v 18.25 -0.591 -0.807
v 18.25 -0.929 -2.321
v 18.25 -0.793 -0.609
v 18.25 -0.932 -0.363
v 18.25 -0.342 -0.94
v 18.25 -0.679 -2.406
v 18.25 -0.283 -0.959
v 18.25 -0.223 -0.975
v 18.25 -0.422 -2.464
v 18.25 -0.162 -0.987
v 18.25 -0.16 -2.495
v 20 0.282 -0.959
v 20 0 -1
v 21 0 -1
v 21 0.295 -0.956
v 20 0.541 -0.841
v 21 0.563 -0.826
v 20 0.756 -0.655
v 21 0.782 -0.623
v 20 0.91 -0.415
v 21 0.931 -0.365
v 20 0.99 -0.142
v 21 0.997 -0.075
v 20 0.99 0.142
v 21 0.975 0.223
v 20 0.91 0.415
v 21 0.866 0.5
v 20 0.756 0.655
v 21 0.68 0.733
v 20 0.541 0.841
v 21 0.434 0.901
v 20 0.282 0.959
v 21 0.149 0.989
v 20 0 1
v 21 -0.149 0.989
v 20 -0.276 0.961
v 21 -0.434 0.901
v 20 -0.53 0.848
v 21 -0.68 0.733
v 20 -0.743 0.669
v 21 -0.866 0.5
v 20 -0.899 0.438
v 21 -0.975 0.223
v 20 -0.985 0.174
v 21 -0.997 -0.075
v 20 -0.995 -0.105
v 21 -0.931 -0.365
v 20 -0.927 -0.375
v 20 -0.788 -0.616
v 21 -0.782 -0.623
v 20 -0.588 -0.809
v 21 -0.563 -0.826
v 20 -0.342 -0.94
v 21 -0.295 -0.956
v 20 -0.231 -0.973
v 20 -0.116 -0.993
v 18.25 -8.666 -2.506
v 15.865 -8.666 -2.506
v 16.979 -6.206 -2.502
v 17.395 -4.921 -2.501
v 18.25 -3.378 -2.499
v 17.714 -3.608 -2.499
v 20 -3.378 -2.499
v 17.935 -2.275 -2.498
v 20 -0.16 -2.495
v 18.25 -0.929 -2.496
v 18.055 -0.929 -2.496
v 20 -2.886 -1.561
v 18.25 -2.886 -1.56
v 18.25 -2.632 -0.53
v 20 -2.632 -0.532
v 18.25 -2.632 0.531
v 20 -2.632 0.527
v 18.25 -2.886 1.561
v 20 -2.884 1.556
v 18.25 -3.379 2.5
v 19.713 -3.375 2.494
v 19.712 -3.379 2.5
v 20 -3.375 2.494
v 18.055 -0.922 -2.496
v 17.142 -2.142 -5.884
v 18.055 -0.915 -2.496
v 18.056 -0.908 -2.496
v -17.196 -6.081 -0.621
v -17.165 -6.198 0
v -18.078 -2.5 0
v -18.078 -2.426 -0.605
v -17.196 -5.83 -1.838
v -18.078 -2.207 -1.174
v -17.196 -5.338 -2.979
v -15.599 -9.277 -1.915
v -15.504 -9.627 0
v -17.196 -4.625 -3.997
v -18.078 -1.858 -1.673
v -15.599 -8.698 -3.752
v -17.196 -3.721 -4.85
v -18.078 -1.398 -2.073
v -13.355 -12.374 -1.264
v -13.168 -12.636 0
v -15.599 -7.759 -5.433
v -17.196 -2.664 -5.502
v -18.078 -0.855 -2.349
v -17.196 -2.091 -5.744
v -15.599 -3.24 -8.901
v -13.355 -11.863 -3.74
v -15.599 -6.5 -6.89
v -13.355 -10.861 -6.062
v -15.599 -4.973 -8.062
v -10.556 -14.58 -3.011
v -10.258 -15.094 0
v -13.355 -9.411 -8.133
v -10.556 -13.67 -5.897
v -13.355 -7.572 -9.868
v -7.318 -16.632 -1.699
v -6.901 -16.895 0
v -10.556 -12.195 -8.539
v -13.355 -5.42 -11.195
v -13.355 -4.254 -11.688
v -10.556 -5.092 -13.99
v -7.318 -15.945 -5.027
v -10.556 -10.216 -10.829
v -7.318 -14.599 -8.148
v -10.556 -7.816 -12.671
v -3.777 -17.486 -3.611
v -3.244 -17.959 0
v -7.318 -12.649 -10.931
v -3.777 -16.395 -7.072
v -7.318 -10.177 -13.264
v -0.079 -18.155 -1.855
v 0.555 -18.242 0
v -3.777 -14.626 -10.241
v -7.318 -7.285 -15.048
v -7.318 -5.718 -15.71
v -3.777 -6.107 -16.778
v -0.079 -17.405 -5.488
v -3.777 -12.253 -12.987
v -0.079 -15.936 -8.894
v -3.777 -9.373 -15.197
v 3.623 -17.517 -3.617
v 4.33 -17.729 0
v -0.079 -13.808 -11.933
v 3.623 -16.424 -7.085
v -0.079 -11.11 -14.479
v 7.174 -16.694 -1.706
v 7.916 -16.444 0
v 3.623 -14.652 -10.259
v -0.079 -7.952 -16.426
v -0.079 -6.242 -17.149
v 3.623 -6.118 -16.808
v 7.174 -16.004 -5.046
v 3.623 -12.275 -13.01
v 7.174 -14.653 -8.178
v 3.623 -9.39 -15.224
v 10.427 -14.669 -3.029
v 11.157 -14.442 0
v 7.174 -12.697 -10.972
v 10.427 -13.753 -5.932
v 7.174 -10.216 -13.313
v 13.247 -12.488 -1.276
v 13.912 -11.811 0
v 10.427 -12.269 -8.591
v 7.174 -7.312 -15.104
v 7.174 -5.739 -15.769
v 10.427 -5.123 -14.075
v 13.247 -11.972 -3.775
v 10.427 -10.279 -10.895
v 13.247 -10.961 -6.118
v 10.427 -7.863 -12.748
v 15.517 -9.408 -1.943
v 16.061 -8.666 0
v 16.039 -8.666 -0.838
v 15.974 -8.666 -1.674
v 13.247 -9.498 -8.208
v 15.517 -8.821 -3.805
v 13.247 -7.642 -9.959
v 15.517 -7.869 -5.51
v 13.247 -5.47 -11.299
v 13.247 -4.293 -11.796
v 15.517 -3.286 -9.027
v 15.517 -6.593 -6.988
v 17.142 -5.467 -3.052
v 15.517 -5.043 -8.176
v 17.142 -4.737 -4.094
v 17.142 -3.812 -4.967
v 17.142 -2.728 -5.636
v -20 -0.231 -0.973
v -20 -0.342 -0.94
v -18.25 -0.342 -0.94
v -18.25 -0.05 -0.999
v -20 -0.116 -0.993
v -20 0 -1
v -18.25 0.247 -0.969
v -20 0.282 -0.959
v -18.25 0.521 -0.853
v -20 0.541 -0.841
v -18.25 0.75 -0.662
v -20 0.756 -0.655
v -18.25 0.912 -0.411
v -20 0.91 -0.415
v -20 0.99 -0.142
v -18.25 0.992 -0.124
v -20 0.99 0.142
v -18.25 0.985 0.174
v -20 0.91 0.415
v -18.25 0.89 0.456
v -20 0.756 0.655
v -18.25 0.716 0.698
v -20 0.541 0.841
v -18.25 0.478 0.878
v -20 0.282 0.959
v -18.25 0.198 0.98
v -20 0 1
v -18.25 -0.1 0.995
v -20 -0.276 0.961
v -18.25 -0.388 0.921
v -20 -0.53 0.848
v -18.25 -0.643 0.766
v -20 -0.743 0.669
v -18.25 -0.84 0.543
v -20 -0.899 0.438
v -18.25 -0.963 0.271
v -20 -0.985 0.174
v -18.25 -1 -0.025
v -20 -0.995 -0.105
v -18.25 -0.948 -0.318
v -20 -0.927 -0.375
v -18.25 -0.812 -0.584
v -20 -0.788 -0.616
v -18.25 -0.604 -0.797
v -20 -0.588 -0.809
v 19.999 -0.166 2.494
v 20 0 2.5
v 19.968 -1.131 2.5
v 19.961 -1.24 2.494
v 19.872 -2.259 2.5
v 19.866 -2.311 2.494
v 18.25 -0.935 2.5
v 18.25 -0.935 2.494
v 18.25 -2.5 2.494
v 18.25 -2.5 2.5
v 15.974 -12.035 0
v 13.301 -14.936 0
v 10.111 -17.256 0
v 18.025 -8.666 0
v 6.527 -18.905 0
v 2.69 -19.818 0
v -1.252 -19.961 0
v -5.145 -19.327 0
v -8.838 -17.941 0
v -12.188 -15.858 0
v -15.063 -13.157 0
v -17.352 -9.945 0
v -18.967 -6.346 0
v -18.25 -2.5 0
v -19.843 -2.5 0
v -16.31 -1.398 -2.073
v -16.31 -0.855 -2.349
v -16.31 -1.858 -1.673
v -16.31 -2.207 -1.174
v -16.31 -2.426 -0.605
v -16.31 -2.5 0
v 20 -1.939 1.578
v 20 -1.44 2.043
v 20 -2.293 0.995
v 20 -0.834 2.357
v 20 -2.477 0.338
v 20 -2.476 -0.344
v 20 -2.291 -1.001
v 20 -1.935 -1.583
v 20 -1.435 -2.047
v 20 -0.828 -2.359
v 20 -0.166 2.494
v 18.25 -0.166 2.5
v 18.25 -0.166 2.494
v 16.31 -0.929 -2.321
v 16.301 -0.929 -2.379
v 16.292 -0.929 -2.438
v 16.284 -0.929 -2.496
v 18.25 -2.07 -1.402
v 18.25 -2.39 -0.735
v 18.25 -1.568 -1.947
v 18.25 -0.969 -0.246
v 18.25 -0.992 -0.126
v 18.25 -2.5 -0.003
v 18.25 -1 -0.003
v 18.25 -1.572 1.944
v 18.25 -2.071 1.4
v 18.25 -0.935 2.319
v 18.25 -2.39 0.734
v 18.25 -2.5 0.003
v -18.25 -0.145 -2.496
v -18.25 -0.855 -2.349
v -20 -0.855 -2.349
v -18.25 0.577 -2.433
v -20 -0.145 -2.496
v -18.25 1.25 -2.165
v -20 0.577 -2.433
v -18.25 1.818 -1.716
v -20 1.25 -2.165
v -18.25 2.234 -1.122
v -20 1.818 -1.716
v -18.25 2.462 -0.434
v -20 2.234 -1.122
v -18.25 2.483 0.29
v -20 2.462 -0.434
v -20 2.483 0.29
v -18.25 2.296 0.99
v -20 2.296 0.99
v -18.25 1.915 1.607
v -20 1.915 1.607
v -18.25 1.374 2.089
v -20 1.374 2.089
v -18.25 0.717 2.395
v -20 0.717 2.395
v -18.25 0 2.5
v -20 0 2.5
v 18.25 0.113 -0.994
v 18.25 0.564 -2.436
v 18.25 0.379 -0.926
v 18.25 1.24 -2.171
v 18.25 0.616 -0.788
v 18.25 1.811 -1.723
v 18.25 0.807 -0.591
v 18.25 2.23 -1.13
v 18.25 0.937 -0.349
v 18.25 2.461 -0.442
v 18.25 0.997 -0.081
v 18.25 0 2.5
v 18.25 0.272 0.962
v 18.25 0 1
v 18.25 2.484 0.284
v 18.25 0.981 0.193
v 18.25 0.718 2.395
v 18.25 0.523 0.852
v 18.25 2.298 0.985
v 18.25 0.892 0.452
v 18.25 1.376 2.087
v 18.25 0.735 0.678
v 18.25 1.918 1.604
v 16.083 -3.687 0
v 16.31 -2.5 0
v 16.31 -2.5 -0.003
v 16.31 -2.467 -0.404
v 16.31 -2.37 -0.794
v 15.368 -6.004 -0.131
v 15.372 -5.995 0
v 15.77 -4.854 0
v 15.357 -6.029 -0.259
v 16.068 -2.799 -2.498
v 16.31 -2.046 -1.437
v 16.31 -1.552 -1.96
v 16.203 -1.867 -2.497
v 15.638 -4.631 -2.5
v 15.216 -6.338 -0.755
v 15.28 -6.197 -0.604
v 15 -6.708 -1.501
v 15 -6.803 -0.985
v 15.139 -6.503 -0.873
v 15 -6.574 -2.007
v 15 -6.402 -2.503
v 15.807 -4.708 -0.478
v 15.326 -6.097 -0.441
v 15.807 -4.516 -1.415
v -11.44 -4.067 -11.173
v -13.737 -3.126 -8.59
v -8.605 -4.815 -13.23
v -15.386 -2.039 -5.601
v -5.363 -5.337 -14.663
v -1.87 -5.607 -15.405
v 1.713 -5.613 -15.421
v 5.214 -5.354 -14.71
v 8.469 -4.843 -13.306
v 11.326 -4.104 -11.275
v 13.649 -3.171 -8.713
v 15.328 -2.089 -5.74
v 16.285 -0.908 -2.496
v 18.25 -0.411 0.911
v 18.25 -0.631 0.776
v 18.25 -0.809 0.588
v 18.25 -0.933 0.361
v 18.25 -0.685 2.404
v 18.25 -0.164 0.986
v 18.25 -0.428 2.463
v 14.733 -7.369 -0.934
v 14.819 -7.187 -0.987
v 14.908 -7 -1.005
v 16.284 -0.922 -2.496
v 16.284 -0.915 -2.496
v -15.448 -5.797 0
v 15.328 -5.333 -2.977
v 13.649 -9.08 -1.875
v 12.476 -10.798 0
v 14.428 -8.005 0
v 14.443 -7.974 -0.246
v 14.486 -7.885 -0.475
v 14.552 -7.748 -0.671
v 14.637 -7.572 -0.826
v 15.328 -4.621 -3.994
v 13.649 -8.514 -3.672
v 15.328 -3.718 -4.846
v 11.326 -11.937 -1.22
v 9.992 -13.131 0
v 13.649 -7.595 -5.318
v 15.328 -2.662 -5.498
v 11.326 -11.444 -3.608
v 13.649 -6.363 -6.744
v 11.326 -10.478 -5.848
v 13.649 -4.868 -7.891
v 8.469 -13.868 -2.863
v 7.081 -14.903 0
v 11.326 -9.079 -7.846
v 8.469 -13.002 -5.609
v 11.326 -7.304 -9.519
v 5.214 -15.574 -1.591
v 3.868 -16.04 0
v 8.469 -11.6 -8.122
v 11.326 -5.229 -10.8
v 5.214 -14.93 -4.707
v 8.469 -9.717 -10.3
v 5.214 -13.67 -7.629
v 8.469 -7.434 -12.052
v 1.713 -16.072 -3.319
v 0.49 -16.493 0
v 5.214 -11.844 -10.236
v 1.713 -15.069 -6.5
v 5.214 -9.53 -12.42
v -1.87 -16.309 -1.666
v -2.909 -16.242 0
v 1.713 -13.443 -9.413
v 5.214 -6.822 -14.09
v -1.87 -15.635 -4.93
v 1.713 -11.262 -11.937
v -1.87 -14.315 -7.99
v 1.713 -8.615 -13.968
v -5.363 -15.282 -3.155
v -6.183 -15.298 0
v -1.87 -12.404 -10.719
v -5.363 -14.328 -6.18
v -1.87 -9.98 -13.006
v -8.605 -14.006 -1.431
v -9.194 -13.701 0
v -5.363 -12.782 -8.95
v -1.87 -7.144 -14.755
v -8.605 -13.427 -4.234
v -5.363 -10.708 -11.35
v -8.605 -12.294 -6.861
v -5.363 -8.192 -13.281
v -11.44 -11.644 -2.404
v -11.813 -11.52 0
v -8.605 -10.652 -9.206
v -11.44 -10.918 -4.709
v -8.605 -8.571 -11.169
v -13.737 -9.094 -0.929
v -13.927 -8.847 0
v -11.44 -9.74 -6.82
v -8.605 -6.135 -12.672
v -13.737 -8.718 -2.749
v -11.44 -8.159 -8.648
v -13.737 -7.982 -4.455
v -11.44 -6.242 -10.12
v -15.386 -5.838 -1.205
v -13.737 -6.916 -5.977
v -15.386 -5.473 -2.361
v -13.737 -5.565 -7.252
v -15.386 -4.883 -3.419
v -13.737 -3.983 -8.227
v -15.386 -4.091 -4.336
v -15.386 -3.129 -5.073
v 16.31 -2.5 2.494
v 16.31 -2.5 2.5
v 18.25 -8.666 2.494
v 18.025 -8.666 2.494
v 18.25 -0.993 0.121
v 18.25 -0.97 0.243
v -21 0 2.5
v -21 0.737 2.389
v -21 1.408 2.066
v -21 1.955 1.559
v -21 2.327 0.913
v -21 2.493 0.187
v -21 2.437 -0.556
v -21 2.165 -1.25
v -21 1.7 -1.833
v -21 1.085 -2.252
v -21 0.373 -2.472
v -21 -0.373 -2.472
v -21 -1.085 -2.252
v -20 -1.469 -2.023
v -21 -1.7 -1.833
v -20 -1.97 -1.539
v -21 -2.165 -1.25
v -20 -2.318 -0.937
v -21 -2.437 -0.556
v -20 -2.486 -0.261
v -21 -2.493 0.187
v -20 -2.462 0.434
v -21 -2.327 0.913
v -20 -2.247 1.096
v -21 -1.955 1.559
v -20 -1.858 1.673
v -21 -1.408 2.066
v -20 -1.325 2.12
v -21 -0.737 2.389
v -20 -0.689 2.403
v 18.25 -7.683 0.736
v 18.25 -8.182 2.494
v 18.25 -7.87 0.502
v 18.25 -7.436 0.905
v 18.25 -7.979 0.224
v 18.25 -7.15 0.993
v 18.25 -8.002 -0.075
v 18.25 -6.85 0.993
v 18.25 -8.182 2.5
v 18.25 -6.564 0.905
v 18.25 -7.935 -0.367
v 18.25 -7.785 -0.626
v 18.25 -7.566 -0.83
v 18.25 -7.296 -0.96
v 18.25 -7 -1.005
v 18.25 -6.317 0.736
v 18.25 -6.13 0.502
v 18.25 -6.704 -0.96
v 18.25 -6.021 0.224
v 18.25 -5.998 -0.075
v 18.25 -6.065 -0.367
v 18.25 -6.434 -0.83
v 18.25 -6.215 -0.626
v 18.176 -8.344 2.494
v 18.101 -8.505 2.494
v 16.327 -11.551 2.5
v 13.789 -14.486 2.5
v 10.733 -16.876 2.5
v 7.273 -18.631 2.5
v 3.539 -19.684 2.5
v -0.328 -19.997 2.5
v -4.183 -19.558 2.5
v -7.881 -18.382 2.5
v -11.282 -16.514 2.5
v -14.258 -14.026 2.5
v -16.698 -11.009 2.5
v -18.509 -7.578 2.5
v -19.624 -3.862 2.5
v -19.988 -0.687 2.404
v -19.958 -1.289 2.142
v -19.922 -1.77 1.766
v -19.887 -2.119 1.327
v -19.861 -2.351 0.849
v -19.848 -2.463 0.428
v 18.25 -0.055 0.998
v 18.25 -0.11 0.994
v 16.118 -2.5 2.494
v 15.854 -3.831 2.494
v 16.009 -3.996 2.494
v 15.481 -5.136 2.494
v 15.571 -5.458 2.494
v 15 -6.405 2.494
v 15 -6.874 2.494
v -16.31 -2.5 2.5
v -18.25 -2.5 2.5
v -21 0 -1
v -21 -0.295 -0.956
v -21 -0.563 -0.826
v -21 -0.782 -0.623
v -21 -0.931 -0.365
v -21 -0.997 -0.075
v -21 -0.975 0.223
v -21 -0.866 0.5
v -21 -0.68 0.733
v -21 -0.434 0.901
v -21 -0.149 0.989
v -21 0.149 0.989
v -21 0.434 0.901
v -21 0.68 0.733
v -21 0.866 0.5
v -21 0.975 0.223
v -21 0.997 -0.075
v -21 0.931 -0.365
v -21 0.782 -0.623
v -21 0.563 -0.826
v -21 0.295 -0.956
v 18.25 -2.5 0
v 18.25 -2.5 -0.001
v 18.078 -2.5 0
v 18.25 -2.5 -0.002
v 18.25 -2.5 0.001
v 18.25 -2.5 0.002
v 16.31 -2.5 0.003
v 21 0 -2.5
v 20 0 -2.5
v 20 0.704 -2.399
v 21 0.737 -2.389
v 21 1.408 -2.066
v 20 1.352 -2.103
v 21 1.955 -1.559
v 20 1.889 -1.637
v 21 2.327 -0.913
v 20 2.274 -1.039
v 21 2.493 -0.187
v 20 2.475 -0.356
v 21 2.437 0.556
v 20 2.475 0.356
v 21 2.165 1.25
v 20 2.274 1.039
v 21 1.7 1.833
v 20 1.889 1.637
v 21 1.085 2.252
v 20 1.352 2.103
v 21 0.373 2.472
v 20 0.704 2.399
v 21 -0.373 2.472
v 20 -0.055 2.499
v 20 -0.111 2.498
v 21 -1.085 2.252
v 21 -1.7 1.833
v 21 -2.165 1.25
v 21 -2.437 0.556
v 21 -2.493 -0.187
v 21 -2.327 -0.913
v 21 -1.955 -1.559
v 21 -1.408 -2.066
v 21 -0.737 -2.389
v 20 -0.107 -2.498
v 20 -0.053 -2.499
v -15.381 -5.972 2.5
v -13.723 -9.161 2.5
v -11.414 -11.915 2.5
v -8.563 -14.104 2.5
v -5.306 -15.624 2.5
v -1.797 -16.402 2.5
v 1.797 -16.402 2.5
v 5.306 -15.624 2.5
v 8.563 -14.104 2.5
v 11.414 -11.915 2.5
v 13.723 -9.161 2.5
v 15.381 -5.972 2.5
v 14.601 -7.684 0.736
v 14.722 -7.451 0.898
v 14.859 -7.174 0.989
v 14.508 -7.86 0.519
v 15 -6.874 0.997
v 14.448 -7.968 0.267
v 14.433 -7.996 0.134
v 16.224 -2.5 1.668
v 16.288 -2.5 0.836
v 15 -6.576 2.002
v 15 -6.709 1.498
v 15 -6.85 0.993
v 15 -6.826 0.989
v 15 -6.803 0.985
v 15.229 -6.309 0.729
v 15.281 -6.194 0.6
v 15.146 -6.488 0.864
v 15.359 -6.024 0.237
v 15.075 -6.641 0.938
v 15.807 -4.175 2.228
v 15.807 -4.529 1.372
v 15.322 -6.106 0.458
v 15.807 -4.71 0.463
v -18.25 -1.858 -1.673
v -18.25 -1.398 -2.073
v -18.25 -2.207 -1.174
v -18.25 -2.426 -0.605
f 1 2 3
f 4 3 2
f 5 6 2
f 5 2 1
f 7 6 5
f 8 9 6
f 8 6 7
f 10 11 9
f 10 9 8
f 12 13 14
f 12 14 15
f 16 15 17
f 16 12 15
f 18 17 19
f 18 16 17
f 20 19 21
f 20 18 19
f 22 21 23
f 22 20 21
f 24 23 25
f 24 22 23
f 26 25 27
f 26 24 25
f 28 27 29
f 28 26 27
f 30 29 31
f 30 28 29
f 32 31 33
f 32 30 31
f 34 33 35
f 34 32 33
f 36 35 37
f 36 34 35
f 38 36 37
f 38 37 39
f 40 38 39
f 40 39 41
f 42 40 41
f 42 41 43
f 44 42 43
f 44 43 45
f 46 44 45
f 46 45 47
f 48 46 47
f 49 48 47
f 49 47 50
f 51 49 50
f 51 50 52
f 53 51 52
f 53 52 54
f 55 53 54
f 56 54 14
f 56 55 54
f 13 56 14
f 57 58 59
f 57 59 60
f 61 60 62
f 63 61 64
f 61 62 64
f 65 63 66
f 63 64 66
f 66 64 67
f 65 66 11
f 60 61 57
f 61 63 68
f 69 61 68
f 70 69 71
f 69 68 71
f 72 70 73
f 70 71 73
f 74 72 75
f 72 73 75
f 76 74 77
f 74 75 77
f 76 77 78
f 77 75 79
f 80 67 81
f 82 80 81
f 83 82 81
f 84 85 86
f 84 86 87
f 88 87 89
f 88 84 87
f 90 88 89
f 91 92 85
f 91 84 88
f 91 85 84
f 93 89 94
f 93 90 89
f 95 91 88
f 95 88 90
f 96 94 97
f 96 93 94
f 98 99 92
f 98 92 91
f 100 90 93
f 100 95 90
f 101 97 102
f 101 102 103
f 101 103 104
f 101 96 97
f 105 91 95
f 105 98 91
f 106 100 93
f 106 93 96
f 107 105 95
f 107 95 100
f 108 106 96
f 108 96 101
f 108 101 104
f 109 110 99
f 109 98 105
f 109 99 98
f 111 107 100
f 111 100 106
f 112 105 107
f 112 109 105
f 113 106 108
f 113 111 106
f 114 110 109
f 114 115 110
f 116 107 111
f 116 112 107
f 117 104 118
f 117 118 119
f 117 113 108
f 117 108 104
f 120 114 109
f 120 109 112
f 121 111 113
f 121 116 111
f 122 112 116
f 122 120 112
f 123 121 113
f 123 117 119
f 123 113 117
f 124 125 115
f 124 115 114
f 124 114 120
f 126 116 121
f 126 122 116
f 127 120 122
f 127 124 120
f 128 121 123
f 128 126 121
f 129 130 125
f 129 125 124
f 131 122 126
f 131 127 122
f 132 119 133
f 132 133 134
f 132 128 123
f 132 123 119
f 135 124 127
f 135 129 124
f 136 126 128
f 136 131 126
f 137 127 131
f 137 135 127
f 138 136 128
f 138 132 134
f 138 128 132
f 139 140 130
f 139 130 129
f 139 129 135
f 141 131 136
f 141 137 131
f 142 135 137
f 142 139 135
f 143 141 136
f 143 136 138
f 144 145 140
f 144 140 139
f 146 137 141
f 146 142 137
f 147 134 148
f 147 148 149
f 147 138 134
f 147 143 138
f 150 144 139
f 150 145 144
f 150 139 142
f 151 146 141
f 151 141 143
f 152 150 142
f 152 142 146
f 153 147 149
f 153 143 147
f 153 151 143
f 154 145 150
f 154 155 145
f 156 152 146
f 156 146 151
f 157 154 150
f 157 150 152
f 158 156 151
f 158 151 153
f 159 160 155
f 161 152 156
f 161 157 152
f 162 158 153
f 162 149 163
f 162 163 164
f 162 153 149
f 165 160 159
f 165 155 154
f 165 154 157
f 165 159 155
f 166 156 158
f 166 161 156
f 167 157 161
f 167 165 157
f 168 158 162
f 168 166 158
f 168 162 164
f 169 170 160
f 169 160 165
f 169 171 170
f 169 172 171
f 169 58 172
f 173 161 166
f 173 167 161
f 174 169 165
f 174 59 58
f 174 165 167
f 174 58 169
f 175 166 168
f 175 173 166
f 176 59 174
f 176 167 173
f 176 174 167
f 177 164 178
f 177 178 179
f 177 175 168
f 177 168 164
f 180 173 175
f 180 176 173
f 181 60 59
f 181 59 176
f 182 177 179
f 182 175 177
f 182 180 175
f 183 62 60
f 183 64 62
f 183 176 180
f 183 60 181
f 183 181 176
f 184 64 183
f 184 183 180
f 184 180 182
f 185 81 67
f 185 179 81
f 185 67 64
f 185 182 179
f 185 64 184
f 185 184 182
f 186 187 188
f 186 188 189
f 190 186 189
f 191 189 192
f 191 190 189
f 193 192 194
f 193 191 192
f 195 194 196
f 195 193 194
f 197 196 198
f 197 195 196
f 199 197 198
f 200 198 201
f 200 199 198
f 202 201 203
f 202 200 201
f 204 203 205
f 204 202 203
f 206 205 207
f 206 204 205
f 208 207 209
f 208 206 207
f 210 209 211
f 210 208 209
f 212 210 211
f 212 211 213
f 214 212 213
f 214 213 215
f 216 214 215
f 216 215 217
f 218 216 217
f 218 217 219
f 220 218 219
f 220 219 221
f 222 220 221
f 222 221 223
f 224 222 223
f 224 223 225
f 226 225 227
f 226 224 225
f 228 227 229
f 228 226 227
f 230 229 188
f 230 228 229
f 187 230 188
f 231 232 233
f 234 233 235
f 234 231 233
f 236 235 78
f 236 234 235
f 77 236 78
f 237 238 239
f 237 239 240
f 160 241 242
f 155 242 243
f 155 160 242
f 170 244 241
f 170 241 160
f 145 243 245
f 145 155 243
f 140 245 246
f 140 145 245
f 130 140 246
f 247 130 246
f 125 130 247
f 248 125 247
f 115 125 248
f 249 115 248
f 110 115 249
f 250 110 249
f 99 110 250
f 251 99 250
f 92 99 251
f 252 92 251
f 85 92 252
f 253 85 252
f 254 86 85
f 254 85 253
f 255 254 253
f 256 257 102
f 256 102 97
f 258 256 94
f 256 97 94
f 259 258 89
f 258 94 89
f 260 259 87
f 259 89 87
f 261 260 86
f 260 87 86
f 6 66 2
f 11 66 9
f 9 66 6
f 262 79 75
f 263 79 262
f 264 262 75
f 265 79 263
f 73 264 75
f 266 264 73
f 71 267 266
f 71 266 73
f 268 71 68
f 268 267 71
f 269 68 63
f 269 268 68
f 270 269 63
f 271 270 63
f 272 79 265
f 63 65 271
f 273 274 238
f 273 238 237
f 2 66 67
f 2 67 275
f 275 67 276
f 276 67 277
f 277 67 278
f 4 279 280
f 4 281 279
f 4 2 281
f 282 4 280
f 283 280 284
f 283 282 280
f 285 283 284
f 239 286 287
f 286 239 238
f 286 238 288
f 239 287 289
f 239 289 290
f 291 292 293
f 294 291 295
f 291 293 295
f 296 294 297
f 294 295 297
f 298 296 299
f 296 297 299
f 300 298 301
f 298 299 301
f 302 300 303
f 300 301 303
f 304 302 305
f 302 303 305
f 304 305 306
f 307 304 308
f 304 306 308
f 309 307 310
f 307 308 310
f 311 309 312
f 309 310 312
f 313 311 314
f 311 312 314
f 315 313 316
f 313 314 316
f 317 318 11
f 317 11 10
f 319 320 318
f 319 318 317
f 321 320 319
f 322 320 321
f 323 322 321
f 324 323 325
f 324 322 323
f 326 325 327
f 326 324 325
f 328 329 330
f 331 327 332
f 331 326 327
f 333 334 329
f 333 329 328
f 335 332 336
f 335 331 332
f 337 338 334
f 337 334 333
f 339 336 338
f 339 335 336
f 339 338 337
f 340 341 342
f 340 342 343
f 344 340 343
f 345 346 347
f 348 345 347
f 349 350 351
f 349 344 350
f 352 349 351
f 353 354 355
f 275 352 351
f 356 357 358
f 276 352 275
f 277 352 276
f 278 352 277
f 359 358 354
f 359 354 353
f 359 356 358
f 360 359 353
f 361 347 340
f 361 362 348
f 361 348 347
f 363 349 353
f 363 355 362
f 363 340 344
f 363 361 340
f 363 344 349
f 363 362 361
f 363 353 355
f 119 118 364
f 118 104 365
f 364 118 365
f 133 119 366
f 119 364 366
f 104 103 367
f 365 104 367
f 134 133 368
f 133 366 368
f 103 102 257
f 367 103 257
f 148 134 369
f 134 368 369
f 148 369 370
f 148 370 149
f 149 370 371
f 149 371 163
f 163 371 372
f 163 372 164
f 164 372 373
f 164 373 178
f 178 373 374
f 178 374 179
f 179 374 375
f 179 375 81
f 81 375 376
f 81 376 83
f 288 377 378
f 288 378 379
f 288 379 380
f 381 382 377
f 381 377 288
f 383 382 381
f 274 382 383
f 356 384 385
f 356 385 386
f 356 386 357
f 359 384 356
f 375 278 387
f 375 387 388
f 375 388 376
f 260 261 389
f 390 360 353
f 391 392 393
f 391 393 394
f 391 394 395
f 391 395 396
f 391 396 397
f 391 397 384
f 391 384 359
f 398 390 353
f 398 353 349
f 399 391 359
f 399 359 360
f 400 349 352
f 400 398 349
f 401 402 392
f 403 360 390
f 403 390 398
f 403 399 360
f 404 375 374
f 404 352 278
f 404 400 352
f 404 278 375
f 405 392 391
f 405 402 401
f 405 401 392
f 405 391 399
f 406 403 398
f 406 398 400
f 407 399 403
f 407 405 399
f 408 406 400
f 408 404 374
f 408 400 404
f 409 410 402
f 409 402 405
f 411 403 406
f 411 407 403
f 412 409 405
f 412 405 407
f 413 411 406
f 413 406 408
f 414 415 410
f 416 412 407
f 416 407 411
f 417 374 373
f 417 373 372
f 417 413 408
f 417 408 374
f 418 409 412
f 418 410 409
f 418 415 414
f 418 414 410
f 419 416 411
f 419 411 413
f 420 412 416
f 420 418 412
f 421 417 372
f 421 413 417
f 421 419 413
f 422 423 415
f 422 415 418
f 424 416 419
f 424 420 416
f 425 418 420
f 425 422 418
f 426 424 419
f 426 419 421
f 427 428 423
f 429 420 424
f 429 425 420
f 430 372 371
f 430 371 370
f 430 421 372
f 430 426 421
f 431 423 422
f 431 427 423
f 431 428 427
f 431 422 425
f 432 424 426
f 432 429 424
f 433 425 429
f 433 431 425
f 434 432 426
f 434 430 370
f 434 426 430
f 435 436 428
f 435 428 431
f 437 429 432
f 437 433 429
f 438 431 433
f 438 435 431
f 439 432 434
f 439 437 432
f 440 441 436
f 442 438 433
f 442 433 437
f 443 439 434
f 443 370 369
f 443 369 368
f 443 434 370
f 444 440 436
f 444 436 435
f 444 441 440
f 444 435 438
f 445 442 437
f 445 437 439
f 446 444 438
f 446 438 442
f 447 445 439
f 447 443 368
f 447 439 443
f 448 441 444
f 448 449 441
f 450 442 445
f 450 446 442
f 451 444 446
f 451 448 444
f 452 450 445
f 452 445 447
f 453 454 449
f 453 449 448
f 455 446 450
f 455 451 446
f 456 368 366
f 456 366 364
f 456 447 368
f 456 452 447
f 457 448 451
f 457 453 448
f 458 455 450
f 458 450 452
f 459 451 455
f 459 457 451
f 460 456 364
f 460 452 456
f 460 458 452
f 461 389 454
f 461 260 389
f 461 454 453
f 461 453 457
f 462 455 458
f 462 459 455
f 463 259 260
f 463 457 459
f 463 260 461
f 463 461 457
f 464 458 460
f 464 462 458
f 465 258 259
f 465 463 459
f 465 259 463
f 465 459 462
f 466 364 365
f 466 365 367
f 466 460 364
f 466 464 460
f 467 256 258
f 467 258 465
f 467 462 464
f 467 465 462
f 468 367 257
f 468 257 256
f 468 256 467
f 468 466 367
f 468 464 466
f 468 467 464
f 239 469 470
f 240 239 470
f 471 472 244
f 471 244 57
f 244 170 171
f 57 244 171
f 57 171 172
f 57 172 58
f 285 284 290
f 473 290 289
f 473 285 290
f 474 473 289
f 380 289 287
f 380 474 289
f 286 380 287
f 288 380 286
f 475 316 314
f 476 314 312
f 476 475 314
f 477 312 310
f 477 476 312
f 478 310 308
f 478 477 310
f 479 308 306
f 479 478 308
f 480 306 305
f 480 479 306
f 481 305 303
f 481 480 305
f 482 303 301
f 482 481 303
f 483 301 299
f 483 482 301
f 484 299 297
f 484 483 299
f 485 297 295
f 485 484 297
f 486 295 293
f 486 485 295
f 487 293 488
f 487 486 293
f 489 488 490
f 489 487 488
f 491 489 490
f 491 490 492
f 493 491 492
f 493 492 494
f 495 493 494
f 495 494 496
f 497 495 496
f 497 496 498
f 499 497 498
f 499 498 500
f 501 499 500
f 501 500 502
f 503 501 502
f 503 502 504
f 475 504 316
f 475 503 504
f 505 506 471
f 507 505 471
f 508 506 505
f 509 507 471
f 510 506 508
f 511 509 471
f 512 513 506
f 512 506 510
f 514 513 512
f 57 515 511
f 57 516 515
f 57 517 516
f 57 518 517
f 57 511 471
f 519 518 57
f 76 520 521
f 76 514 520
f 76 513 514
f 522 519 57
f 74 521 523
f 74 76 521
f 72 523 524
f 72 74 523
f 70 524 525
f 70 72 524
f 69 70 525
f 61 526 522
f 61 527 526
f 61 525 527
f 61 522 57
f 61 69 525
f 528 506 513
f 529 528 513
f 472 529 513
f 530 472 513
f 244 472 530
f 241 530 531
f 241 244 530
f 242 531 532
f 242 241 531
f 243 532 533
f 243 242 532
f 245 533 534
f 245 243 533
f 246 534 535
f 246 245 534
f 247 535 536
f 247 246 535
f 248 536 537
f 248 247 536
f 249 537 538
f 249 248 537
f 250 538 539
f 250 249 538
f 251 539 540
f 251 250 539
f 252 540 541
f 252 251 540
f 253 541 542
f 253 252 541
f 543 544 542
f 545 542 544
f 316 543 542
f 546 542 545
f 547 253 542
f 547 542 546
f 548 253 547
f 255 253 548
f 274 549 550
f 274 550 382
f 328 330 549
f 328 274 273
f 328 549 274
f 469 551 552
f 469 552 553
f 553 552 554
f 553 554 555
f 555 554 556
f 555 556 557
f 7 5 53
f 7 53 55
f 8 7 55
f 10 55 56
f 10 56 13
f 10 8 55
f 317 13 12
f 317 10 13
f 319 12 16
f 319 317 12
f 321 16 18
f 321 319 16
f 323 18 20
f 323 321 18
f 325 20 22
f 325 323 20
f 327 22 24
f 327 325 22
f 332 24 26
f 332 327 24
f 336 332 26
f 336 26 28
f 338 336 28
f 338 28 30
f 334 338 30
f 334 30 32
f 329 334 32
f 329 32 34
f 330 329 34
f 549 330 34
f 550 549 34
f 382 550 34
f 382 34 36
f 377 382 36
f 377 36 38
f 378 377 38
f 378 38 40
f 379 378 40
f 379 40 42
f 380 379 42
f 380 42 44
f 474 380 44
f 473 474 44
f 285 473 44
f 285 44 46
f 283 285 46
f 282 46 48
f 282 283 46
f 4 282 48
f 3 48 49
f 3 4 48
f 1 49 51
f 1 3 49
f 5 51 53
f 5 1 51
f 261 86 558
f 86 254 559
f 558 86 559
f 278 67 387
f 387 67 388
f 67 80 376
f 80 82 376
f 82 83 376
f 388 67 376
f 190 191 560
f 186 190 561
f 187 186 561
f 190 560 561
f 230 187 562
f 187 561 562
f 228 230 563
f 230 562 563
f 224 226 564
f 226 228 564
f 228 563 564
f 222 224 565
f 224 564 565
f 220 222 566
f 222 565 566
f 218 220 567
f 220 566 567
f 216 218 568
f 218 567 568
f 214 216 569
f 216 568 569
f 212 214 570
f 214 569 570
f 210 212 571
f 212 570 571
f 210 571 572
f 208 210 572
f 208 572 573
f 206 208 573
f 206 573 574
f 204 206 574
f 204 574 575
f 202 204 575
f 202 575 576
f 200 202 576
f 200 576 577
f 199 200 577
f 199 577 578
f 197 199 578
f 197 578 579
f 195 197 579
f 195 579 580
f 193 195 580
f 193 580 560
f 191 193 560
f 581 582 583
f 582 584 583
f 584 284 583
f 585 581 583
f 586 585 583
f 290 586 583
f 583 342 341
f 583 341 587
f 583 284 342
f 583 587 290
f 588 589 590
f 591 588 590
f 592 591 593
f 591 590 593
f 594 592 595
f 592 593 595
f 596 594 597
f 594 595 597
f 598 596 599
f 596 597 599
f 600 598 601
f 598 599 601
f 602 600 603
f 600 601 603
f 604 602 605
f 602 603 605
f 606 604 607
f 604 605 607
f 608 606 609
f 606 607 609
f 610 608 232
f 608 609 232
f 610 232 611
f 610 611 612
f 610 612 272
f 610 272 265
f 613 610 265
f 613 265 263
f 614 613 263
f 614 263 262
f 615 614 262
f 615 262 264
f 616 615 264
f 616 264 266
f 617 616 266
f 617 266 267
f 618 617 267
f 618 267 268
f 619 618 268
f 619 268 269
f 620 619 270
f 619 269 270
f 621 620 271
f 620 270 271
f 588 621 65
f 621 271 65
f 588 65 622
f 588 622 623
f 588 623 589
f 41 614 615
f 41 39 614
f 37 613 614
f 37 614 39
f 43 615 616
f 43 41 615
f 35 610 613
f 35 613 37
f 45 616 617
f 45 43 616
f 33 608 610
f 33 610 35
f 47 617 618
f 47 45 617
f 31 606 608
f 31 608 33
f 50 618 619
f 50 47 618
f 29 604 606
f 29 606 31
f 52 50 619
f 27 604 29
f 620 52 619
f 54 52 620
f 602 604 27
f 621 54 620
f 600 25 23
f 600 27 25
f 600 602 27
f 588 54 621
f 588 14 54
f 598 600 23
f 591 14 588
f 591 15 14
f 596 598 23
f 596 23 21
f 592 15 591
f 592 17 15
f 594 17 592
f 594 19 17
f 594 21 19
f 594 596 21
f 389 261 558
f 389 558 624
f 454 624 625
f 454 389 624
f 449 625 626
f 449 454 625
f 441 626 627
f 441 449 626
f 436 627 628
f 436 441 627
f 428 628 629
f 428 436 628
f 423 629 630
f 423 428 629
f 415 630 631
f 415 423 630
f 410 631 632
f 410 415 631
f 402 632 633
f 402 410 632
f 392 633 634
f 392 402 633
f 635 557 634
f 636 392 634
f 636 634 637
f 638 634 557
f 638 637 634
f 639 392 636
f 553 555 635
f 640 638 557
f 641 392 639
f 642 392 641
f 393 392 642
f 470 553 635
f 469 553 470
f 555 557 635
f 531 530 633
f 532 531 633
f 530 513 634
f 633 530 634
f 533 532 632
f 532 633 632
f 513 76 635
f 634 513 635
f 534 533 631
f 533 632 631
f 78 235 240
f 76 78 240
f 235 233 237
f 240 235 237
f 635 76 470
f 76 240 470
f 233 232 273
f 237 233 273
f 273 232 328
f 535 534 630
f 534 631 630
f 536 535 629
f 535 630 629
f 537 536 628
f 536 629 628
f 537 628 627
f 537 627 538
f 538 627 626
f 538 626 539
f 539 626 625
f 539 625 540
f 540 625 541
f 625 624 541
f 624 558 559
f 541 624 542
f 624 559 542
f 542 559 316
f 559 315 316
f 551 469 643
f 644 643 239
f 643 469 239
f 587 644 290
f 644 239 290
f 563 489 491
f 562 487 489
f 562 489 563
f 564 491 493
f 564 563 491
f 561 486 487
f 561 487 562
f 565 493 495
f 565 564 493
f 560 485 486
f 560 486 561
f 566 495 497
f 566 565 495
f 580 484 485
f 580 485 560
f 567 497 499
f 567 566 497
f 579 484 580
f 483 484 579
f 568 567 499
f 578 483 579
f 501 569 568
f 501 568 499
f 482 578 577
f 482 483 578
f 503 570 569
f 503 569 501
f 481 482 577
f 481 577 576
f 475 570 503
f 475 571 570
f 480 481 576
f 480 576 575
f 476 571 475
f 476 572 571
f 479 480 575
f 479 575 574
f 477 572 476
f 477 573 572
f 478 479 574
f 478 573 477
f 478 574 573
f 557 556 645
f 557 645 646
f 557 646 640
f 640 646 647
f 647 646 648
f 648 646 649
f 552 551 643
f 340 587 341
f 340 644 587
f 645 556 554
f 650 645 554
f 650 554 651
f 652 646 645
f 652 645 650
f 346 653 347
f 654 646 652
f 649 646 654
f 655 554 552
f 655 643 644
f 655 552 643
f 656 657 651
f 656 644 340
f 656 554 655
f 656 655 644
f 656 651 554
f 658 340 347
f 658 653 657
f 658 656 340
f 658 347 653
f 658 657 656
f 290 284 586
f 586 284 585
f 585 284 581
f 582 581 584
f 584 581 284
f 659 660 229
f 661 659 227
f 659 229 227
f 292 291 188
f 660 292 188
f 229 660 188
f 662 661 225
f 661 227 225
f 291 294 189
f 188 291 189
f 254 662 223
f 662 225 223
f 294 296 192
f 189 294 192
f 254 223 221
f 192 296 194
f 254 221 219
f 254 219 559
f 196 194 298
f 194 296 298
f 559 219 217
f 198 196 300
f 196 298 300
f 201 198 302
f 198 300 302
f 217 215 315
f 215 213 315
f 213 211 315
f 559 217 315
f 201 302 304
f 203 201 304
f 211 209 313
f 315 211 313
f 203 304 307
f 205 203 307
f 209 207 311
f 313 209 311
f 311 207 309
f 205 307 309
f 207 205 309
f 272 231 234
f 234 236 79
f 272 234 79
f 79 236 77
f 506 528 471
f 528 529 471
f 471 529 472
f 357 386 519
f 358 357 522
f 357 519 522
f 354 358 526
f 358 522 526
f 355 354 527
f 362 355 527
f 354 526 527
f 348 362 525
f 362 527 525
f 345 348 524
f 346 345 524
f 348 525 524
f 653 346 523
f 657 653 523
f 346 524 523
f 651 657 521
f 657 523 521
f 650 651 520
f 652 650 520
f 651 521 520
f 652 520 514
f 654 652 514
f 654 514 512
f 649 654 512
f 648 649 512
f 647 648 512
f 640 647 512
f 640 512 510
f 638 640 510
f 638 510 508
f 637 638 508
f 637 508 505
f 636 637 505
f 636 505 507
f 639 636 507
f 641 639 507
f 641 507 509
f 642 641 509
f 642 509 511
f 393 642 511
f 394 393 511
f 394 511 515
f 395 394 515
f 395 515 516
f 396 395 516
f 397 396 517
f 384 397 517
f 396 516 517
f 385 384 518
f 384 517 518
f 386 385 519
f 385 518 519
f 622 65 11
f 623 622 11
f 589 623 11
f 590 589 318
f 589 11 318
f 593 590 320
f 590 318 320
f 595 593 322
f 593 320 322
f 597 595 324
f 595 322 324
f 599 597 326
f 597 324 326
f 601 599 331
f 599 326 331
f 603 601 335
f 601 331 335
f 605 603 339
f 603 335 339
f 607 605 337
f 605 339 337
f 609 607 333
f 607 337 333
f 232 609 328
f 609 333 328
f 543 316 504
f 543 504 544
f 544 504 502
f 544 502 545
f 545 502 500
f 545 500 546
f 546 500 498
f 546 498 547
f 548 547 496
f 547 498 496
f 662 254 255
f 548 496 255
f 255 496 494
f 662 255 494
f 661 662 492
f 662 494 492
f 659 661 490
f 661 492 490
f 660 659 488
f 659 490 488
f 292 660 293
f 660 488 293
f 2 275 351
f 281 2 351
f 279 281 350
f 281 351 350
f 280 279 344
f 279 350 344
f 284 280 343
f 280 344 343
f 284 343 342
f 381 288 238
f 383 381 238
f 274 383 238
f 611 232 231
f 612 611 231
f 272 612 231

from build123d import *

# Parameters (mm, degrees)
EXTRUDE_1_DEPTH          = 2.5
REVOLVE_1_ANGLE          = 70.00000000000016
EXTRUDE_2_DEPTH          = 20
EXTRUDE_2_DEPTH_BACK     = 20
SKETCH_4_R               = 2.5
SKETCH_4_R_2             = 1
CUT_EXTRUDE_1_DEPTH      = 18.25
CUT_EXTRUDE_1_DEPTH_BACK = 18.25
SKETCH_5_R               = 1
CUT_EXTRUDE_START        = -100
SKETCH_6_R               = 1
CUT_EXTRUDE_2_DEPTH      = 100
EXTRUDE_START            = -5
SKETCH_8_R               = 1
EXTRUDE_3_DEPTH          = 5
SKETCH_9_R               = 1.004563182831931
CUT_EXTRUDE_3_DEPTH      = 10
EXTRUDE_START_2          = 1
SKETCH_10_R              = 2.5
SKETCH_10_R_2            = 1
EXTRUDE_4_DEPTH          = 1
SKETCH_11_R              = 2.500000000000001
SKETCH_11_R_2            = 1.0000000000000002
EXTRUDE_5_DEPTH          = 1
SKETCH_13_W              = 11.686063100659794
SKETCH_13_H              = 0.769389088656252
CUT_EXTRUDE_4_DEPTH      = 10
CUT_EXTRUDE_5_DEPTH      = 10
SKETCH_15_R              = 4.4
CUT_EXTRUDE_7_DEPTH      = 1.75


with BuildPart() as part:
    # 草图1 → 凸台-拉伸1 (new body)
    with BuildSketch(Plane.XY):
        with BuildLine():
            Line((-20, 0), (-16.500000000000004, 0))
            ThreePointArc((-16.500000000000004, 0), (1.01e-15, -16.499999999999996), (16.500000000000004, 0))
            Line((16.500000000000004, 0), (20, 0))
            ThreePointArc((20, 0), (1.22e-15, -19.999999999999982), (-20, 0))
        make_face()
    extrude(amount=EXTRUDE_1_DEPTH)

    # 草图2 → 旋转1 (revolve)
    with BuildSketch(Plane(origin=(0, 0, 0), x_dir=(-1, 0, 0), z_dir=(0, 0, -1))):
        with BuildLine():
            Line((-18.25, 0), (-16.500000000000004, 0))
            ThreePointArc((-16.500000000000004, 0), (1.01e-15, -16.5), (16.500000000000004, 1.33e-15))
            Line((16.500000000000004, 1.33e-15), (18.250000000000004, 6.6e-16))
            ThreePointArc((18.250000000000004, 6.6e-16), (-2.93e-15, -18.25), (-18.25, 0))
        make_face()
    revolve(axis=Axis((16.500000000000004, 0, 0), (1, -4e-17, 0)), revolution_arc=REVOLVE_1_ANGLE)

    # 草图4 → 凸台-拉伸2 (add, two sides: drawn at the far end of the back side and taken through both)
    with BuildSketch(Plane(origin=(0, 0, 0), x_dir=(0, 0, -1), z_dir=(1, 0, 0)).offset(-EXTRUDE_2_DEPTH_BACK)):
        Circle(SKETCH_4_R)
        Circle(SKETCH_4_R_2, mode=Mode.SUBTRACT)
    extrude(amount=EXTRUDE_2_DEPTH + EXTRUDE_2_DEPTH_BACK)

    # 草图5 → 切除-拉伸1 (cut, two sides: drawn at the far end of the back side and taken through both)
    with BuildSketch(Plane(origin=(0, 0, 0), x_dir=(0, 0, -1), z_dir=(1, 0, 0)).offset(-CUT_EXTRUDE_1_DEPTH_BACK)):
        with BuildLine():
            Line((0, -2.5), (-2.5, -2.5))
            Line((-2.5, -2.5), (-2.5, 0))
            ThreePointArc((-2.5, 0), (1.767766952966369, 1.76776695296637), (0, -2.5))
        make_face()
        Circle(SKETCH_5_R, mode=Mode.SUBTRACT)
    extrude(amount=CUT_EXTRUDE_1_DEPTH + CUT_EXTRUDE_1_DEPTH_BACK, mode=Mode.SUBTRACT)

    # 草图6 → 切除-拉伸2 (cut)
    with BuildSketch(Plane(origin=(20, 0, 0), x_dir=(0, 0, -1), z_dir=(1, 0, 0)).offset(CUT_EXTRUDE_START)):
        Circle(SKETCH_6_R)
    extrude(amount=CUT_EXTRUDE_2_DEPTH, mode=Mode.SUBTRACT)

    # 草图8 → 凸台-拉伸3 (add)
    with BuildSketch(Plane(origin=(20, 0, 0), x_dir=(0, 0, -1), z_dir=(1, 0, 0)).offset(EXTRUDE_START)):
        with BuildLine():
            ThreePointArc((2.494892647035231, -0.15972063038174344), (0.00312163823150463, -2.499998051074191), (-2.4944859955512104, -0.1659506492873415))
            Line((-2.49448599555121, -0.1659506492873411), (-2.494485995551209, -8.66595064928734))
            Line((-2.494485995551209, -8.66595064928734), (2.505514004448791, -8.66595064928734))
            Line((2.505514004448791, -8.66595064928734), (2.4948926470352397, -0.15972063038174333))
        make_face()
        with Locations((8.6e-16, -7)):
            Circle(SKETCH_8_R, mode=Mode.SUBTRACT)
    extrude(amount=EXTRUDE_3_DEPTH)

    # 草图9 → 切除-拉伸3 (cut)
    with BuildSketch(Plane(origin=(20, 0, 0), x_dir=(0, 0, -1), z_dir=(1, 0, 0))):
        with Locations((8.6e-16, -7)):
            Circle(SKETCH_9_R)
    extrude(amount=-CUT_EXTRUDE_3_DEPTH, mode=Mode.SUBTRACT)

    # 草图10 → 凸台-拉伸4 (add)
    with BuildSketch(Plane.ZY.offset(20).offset(EXTRUDE_START_2)):
        Circle(SKETCH_10_R)
        Circle(SKETCH_10_R_2, mode=Mode.SUBTRACT)
    extrude(amount=-EXTRUDE_4_DEPTH)

    # 草图11 → 凸台-拉伸5 (add)
    with BuildSketch(Plane(origin=(20, 0, 0), x_dir=(0, 0, -1), z_dir=(1, 0, 0))):
        Circle(SKETCH_11_R)
        Circle(SKETCH_11_R_2, mode=Mode.SUBTRACT)
    extrude(amount=EXTRUDE_5_DEPTH)

    # 草图12 → 切除-旋转1 (revolve, cut)
    with BuildSketch(Plane.XY):
        with BuildLine():
            Line((-16.499999999999996, 0), (16.499999999999996, 0))
            ThreePointArc((16.499999999999996, 0), (1.01e-15, -16.499999999999993), (-16.499999999999996, 0))
        make_face()
    revolve(axis=Axis((-16.499999999999996, 0, 0), (1, 0, 0)), mode=Mode.SUBTRACT)

    # 草图13 → 切除-拉伸4 (cut)
    with BuildSketch(Plane(origin=(0, 0.00311500945287562, -2.4946893212932255), x_dir=(-1, 0, 0), z_dir=(0, 0.00124865529263255, -0.9999992204296763))):
        with Locations((-12.406968449670103, -0.5475303111045247)):
            Rectangle(SKETCH_13_W, SKETCH_13_H)
    extrude(amount=-CUT_EXTRUDE_4_DEPTH, mode=Mode.SUBTRACT)

    # 草图14 → 切除-拉伸5 (cut)
    with BuildSketch(Plane.ZY.offset(-18.25)):
        Polygon((-0.00312163823158233, 1.94892580969e-06), (2.4999999999999996, 1.94892580969e-06), (2.5, -2.5), (-0.00312163823158202, -2.4999980510741904), align=None)
    extrude(amount=CUT_EXTRUDE_5_DEPTH, mode=Mode.SUBTRACT)

    # 草图15 → 切除-拉伸7 (cut)
    with BuildSketch(Plane(origin=(20, 0, 0), x_dir=(0, 0, -1), z_dir=(1, 0, 0))):
        with Locations((8.6e-16, -7)):
            Circle(SKETCH_15_R)
    extrude(amount=-CUT_EXTRUDE_7_DEPTH, mode=Mode.SUBTRACT)


solid = part.part
